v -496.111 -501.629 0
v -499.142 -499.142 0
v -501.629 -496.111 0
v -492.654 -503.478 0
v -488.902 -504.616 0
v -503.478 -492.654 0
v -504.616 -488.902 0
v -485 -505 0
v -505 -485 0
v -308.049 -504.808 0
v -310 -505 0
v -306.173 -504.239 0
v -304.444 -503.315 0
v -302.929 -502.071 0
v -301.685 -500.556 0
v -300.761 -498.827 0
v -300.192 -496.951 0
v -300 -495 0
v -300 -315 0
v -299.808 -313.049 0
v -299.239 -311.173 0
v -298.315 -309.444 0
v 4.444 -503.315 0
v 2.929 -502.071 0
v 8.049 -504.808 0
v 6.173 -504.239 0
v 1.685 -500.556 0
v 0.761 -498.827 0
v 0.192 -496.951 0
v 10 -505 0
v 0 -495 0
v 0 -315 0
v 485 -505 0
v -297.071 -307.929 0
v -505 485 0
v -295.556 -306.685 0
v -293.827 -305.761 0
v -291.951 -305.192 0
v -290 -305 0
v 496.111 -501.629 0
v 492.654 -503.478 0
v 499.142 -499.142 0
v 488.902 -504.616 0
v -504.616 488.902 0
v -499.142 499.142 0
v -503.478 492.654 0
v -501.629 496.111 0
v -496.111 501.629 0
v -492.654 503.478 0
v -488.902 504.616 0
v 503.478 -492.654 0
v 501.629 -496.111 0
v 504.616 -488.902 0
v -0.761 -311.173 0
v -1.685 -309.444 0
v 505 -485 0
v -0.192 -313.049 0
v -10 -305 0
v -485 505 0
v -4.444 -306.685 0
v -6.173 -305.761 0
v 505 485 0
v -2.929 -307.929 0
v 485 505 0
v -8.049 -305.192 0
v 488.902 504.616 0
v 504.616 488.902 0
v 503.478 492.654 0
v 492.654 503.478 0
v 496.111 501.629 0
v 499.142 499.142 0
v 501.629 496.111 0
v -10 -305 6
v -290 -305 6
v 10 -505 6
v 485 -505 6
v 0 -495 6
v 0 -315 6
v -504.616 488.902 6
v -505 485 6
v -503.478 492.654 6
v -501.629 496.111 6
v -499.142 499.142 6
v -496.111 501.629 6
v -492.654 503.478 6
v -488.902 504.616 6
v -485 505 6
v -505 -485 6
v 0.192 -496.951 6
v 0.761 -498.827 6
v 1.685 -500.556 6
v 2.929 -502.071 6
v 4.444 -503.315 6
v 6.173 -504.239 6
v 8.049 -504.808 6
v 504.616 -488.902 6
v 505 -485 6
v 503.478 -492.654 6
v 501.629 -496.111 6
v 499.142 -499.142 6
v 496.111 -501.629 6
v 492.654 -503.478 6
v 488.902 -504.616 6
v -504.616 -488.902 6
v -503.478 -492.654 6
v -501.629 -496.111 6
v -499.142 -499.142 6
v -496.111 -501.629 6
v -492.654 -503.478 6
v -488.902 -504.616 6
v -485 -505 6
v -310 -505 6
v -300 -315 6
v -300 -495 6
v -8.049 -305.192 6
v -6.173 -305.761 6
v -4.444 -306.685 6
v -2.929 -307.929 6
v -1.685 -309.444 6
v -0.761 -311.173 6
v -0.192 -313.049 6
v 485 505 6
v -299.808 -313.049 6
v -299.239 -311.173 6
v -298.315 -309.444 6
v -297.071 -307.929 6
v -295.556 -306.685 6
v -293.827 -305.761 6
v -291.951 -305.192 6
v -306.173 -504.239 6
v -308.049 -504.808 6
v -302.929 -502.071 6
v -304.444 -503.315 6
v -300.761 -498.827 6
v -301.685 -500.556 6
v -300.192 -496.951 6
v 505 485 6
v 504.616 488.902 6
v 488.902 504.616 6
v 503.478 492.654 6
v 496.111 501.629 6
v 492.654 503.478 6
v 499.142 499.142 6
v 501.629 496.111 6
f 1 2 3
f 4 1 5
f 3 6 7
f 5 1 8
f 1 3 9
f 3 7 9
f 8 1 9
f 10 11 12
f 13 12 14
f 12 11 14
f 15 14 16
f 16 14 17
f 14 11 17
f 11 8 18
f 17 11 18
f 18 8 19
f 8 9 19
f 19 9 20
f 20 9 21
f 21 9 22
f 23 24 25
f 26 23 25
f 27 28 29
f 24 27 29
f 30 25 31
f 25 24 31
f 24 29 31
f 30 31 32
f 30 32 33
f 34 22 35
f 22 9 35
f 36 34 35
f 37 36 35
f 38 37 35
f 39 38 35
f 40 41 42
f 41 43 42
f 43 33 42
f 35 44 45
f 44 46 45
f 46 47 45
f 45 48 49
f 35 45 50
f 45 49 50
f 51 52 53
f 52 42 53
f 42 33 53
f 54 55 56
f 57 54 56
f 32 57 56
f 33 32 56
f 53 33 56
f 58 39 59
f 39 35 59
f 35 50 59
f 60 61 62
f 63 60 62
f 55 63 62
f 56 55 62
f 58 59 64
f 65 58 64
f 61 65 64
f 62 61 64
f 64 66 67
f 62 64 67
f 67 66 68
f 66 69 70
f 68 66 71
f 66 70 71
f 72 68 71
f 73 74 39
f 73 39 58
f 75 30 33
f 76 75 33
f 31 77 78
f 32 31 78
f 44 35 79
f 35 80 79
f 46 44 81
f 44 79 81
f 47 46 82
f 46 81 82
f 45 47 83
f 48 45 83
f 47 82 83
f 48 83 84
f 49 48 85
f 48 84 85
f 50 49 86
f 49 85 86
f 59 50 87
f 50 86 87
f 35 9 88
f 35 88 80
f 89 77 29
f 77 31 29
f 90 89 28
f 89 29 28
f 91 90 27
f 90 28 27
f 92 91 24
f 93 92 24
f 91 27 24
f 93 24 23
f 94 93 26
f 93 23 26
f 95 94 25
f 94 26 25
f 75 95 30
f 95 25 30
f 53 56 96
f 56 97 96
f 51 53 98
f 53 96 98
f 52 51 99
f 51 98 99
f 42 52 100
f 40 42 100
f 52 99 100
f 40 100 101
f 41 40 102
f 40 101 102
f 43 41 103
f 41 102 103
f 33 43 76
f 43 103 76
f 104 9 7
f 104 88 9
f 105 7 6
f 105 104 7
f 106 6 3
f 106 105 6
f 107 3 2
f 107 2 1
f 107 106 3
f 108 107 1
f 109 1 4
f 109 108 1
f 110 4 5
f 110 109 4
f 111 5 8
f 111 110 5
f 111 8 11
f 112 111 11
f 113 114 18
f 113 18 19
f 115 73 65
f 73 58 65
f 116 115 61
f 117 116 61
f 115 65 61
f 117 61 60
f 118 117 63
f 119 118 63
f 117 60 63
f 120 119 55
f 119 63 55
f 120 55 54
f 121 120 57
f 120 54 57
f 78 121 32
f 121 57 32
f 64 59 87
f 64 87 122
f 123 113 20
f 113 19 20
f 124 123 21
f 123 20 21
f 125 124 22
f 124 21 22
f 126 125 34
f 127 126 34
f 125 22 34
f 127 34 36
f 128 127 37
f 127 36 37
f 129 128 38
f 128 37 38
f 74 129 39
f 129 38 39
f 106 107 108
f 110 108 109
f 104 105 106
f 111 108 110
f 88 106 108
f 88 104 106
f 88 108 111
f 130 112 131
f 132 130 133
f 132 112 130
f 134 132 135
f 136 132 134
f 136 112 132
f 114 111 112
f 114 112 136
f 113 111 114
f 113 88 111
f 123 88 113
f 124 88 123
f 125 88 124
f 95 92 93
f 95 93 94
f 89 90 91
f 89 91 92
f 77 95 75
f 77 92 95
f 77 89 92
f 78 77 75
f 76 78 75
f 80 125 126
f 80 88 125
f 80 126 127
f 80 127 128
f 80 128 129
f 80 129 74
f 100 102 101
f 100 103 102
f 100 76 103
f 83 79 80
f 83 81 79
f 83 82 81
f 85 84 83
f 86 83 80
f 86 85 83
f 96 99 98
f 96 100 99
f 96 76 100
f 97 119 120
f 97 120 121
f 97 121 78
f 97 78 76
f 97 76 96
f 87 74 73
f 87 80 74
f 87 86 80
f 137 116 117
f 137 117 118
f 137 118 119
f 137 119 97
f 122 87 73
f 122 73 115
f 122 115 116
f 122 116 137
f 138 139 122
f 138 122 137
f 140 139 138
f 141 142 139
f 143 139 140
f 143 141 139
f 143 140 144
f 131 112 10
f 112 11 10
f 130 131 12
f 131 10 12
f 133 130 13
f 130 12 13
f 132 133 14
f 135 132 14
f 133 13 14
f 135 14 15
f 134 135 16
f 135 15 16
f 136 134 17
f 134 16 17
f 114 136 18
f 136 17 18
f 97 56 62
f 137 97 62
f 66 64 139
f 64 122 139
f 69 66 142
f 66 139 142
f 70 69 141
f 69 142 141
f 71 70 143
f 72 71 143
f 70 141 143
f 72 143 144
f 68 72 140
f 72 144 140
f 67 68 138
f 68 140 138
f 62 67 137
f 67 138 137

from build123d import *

# Parameters (mm, degrees)
SKETCH1_W           = 1010
SKETCH1_H           = 1010
BOSS_EXTRUDE1_DEPTH = 6
SKETCH2_W           = 300
SKETCH2_H           = 200
CUT_EXTRUDE1_DEPTH  = 6
FILLET2_R           = 20
FILLET3_R           = 10


with BuildPart() as part:
    # Sketch1 → Boss-Extrude1 (new body)
    with BuildSketch(Plane.XY):
        Rectangle(SKETCH1_W, SKETCH1_H)
    extrude(amount=BOSS_EXTRUDE1_DEPTH)

    # Sketch2 → Cut-Extrude1 (cut)
    with BuildSketch(Plane.XY.offset(6)):
        with Locations((-150, -405)):
            Rectangle(SKETCH2_W, SKETCH2_H)
    extrude(amount=-CUT_EXTRUDE1_DEPTH, mode=Mode.SUBTRACT)

    # Fillet2
    fillet2_edges = [part.edges().sort_by_distance(p)[0] for p in [
        (-505, 505, 3),
        (505, 505, 3),
        (505, -505, 3),
        (-505, -505, 3),
    ]]
    fillet(fillet2_edges, radius=FILLET2_R)

    # Fillet3
    fillet3_edges = [part.edges().sort_by_distance(p)[0] for p in [
        (-300, -505, 3),
        (-300, -305, 3),
        (0, -305, 3),
        (0, -505, 3),
    ]]
    fillet(fillet3_edges, radius=FILLET3_R)


solid = part.part
